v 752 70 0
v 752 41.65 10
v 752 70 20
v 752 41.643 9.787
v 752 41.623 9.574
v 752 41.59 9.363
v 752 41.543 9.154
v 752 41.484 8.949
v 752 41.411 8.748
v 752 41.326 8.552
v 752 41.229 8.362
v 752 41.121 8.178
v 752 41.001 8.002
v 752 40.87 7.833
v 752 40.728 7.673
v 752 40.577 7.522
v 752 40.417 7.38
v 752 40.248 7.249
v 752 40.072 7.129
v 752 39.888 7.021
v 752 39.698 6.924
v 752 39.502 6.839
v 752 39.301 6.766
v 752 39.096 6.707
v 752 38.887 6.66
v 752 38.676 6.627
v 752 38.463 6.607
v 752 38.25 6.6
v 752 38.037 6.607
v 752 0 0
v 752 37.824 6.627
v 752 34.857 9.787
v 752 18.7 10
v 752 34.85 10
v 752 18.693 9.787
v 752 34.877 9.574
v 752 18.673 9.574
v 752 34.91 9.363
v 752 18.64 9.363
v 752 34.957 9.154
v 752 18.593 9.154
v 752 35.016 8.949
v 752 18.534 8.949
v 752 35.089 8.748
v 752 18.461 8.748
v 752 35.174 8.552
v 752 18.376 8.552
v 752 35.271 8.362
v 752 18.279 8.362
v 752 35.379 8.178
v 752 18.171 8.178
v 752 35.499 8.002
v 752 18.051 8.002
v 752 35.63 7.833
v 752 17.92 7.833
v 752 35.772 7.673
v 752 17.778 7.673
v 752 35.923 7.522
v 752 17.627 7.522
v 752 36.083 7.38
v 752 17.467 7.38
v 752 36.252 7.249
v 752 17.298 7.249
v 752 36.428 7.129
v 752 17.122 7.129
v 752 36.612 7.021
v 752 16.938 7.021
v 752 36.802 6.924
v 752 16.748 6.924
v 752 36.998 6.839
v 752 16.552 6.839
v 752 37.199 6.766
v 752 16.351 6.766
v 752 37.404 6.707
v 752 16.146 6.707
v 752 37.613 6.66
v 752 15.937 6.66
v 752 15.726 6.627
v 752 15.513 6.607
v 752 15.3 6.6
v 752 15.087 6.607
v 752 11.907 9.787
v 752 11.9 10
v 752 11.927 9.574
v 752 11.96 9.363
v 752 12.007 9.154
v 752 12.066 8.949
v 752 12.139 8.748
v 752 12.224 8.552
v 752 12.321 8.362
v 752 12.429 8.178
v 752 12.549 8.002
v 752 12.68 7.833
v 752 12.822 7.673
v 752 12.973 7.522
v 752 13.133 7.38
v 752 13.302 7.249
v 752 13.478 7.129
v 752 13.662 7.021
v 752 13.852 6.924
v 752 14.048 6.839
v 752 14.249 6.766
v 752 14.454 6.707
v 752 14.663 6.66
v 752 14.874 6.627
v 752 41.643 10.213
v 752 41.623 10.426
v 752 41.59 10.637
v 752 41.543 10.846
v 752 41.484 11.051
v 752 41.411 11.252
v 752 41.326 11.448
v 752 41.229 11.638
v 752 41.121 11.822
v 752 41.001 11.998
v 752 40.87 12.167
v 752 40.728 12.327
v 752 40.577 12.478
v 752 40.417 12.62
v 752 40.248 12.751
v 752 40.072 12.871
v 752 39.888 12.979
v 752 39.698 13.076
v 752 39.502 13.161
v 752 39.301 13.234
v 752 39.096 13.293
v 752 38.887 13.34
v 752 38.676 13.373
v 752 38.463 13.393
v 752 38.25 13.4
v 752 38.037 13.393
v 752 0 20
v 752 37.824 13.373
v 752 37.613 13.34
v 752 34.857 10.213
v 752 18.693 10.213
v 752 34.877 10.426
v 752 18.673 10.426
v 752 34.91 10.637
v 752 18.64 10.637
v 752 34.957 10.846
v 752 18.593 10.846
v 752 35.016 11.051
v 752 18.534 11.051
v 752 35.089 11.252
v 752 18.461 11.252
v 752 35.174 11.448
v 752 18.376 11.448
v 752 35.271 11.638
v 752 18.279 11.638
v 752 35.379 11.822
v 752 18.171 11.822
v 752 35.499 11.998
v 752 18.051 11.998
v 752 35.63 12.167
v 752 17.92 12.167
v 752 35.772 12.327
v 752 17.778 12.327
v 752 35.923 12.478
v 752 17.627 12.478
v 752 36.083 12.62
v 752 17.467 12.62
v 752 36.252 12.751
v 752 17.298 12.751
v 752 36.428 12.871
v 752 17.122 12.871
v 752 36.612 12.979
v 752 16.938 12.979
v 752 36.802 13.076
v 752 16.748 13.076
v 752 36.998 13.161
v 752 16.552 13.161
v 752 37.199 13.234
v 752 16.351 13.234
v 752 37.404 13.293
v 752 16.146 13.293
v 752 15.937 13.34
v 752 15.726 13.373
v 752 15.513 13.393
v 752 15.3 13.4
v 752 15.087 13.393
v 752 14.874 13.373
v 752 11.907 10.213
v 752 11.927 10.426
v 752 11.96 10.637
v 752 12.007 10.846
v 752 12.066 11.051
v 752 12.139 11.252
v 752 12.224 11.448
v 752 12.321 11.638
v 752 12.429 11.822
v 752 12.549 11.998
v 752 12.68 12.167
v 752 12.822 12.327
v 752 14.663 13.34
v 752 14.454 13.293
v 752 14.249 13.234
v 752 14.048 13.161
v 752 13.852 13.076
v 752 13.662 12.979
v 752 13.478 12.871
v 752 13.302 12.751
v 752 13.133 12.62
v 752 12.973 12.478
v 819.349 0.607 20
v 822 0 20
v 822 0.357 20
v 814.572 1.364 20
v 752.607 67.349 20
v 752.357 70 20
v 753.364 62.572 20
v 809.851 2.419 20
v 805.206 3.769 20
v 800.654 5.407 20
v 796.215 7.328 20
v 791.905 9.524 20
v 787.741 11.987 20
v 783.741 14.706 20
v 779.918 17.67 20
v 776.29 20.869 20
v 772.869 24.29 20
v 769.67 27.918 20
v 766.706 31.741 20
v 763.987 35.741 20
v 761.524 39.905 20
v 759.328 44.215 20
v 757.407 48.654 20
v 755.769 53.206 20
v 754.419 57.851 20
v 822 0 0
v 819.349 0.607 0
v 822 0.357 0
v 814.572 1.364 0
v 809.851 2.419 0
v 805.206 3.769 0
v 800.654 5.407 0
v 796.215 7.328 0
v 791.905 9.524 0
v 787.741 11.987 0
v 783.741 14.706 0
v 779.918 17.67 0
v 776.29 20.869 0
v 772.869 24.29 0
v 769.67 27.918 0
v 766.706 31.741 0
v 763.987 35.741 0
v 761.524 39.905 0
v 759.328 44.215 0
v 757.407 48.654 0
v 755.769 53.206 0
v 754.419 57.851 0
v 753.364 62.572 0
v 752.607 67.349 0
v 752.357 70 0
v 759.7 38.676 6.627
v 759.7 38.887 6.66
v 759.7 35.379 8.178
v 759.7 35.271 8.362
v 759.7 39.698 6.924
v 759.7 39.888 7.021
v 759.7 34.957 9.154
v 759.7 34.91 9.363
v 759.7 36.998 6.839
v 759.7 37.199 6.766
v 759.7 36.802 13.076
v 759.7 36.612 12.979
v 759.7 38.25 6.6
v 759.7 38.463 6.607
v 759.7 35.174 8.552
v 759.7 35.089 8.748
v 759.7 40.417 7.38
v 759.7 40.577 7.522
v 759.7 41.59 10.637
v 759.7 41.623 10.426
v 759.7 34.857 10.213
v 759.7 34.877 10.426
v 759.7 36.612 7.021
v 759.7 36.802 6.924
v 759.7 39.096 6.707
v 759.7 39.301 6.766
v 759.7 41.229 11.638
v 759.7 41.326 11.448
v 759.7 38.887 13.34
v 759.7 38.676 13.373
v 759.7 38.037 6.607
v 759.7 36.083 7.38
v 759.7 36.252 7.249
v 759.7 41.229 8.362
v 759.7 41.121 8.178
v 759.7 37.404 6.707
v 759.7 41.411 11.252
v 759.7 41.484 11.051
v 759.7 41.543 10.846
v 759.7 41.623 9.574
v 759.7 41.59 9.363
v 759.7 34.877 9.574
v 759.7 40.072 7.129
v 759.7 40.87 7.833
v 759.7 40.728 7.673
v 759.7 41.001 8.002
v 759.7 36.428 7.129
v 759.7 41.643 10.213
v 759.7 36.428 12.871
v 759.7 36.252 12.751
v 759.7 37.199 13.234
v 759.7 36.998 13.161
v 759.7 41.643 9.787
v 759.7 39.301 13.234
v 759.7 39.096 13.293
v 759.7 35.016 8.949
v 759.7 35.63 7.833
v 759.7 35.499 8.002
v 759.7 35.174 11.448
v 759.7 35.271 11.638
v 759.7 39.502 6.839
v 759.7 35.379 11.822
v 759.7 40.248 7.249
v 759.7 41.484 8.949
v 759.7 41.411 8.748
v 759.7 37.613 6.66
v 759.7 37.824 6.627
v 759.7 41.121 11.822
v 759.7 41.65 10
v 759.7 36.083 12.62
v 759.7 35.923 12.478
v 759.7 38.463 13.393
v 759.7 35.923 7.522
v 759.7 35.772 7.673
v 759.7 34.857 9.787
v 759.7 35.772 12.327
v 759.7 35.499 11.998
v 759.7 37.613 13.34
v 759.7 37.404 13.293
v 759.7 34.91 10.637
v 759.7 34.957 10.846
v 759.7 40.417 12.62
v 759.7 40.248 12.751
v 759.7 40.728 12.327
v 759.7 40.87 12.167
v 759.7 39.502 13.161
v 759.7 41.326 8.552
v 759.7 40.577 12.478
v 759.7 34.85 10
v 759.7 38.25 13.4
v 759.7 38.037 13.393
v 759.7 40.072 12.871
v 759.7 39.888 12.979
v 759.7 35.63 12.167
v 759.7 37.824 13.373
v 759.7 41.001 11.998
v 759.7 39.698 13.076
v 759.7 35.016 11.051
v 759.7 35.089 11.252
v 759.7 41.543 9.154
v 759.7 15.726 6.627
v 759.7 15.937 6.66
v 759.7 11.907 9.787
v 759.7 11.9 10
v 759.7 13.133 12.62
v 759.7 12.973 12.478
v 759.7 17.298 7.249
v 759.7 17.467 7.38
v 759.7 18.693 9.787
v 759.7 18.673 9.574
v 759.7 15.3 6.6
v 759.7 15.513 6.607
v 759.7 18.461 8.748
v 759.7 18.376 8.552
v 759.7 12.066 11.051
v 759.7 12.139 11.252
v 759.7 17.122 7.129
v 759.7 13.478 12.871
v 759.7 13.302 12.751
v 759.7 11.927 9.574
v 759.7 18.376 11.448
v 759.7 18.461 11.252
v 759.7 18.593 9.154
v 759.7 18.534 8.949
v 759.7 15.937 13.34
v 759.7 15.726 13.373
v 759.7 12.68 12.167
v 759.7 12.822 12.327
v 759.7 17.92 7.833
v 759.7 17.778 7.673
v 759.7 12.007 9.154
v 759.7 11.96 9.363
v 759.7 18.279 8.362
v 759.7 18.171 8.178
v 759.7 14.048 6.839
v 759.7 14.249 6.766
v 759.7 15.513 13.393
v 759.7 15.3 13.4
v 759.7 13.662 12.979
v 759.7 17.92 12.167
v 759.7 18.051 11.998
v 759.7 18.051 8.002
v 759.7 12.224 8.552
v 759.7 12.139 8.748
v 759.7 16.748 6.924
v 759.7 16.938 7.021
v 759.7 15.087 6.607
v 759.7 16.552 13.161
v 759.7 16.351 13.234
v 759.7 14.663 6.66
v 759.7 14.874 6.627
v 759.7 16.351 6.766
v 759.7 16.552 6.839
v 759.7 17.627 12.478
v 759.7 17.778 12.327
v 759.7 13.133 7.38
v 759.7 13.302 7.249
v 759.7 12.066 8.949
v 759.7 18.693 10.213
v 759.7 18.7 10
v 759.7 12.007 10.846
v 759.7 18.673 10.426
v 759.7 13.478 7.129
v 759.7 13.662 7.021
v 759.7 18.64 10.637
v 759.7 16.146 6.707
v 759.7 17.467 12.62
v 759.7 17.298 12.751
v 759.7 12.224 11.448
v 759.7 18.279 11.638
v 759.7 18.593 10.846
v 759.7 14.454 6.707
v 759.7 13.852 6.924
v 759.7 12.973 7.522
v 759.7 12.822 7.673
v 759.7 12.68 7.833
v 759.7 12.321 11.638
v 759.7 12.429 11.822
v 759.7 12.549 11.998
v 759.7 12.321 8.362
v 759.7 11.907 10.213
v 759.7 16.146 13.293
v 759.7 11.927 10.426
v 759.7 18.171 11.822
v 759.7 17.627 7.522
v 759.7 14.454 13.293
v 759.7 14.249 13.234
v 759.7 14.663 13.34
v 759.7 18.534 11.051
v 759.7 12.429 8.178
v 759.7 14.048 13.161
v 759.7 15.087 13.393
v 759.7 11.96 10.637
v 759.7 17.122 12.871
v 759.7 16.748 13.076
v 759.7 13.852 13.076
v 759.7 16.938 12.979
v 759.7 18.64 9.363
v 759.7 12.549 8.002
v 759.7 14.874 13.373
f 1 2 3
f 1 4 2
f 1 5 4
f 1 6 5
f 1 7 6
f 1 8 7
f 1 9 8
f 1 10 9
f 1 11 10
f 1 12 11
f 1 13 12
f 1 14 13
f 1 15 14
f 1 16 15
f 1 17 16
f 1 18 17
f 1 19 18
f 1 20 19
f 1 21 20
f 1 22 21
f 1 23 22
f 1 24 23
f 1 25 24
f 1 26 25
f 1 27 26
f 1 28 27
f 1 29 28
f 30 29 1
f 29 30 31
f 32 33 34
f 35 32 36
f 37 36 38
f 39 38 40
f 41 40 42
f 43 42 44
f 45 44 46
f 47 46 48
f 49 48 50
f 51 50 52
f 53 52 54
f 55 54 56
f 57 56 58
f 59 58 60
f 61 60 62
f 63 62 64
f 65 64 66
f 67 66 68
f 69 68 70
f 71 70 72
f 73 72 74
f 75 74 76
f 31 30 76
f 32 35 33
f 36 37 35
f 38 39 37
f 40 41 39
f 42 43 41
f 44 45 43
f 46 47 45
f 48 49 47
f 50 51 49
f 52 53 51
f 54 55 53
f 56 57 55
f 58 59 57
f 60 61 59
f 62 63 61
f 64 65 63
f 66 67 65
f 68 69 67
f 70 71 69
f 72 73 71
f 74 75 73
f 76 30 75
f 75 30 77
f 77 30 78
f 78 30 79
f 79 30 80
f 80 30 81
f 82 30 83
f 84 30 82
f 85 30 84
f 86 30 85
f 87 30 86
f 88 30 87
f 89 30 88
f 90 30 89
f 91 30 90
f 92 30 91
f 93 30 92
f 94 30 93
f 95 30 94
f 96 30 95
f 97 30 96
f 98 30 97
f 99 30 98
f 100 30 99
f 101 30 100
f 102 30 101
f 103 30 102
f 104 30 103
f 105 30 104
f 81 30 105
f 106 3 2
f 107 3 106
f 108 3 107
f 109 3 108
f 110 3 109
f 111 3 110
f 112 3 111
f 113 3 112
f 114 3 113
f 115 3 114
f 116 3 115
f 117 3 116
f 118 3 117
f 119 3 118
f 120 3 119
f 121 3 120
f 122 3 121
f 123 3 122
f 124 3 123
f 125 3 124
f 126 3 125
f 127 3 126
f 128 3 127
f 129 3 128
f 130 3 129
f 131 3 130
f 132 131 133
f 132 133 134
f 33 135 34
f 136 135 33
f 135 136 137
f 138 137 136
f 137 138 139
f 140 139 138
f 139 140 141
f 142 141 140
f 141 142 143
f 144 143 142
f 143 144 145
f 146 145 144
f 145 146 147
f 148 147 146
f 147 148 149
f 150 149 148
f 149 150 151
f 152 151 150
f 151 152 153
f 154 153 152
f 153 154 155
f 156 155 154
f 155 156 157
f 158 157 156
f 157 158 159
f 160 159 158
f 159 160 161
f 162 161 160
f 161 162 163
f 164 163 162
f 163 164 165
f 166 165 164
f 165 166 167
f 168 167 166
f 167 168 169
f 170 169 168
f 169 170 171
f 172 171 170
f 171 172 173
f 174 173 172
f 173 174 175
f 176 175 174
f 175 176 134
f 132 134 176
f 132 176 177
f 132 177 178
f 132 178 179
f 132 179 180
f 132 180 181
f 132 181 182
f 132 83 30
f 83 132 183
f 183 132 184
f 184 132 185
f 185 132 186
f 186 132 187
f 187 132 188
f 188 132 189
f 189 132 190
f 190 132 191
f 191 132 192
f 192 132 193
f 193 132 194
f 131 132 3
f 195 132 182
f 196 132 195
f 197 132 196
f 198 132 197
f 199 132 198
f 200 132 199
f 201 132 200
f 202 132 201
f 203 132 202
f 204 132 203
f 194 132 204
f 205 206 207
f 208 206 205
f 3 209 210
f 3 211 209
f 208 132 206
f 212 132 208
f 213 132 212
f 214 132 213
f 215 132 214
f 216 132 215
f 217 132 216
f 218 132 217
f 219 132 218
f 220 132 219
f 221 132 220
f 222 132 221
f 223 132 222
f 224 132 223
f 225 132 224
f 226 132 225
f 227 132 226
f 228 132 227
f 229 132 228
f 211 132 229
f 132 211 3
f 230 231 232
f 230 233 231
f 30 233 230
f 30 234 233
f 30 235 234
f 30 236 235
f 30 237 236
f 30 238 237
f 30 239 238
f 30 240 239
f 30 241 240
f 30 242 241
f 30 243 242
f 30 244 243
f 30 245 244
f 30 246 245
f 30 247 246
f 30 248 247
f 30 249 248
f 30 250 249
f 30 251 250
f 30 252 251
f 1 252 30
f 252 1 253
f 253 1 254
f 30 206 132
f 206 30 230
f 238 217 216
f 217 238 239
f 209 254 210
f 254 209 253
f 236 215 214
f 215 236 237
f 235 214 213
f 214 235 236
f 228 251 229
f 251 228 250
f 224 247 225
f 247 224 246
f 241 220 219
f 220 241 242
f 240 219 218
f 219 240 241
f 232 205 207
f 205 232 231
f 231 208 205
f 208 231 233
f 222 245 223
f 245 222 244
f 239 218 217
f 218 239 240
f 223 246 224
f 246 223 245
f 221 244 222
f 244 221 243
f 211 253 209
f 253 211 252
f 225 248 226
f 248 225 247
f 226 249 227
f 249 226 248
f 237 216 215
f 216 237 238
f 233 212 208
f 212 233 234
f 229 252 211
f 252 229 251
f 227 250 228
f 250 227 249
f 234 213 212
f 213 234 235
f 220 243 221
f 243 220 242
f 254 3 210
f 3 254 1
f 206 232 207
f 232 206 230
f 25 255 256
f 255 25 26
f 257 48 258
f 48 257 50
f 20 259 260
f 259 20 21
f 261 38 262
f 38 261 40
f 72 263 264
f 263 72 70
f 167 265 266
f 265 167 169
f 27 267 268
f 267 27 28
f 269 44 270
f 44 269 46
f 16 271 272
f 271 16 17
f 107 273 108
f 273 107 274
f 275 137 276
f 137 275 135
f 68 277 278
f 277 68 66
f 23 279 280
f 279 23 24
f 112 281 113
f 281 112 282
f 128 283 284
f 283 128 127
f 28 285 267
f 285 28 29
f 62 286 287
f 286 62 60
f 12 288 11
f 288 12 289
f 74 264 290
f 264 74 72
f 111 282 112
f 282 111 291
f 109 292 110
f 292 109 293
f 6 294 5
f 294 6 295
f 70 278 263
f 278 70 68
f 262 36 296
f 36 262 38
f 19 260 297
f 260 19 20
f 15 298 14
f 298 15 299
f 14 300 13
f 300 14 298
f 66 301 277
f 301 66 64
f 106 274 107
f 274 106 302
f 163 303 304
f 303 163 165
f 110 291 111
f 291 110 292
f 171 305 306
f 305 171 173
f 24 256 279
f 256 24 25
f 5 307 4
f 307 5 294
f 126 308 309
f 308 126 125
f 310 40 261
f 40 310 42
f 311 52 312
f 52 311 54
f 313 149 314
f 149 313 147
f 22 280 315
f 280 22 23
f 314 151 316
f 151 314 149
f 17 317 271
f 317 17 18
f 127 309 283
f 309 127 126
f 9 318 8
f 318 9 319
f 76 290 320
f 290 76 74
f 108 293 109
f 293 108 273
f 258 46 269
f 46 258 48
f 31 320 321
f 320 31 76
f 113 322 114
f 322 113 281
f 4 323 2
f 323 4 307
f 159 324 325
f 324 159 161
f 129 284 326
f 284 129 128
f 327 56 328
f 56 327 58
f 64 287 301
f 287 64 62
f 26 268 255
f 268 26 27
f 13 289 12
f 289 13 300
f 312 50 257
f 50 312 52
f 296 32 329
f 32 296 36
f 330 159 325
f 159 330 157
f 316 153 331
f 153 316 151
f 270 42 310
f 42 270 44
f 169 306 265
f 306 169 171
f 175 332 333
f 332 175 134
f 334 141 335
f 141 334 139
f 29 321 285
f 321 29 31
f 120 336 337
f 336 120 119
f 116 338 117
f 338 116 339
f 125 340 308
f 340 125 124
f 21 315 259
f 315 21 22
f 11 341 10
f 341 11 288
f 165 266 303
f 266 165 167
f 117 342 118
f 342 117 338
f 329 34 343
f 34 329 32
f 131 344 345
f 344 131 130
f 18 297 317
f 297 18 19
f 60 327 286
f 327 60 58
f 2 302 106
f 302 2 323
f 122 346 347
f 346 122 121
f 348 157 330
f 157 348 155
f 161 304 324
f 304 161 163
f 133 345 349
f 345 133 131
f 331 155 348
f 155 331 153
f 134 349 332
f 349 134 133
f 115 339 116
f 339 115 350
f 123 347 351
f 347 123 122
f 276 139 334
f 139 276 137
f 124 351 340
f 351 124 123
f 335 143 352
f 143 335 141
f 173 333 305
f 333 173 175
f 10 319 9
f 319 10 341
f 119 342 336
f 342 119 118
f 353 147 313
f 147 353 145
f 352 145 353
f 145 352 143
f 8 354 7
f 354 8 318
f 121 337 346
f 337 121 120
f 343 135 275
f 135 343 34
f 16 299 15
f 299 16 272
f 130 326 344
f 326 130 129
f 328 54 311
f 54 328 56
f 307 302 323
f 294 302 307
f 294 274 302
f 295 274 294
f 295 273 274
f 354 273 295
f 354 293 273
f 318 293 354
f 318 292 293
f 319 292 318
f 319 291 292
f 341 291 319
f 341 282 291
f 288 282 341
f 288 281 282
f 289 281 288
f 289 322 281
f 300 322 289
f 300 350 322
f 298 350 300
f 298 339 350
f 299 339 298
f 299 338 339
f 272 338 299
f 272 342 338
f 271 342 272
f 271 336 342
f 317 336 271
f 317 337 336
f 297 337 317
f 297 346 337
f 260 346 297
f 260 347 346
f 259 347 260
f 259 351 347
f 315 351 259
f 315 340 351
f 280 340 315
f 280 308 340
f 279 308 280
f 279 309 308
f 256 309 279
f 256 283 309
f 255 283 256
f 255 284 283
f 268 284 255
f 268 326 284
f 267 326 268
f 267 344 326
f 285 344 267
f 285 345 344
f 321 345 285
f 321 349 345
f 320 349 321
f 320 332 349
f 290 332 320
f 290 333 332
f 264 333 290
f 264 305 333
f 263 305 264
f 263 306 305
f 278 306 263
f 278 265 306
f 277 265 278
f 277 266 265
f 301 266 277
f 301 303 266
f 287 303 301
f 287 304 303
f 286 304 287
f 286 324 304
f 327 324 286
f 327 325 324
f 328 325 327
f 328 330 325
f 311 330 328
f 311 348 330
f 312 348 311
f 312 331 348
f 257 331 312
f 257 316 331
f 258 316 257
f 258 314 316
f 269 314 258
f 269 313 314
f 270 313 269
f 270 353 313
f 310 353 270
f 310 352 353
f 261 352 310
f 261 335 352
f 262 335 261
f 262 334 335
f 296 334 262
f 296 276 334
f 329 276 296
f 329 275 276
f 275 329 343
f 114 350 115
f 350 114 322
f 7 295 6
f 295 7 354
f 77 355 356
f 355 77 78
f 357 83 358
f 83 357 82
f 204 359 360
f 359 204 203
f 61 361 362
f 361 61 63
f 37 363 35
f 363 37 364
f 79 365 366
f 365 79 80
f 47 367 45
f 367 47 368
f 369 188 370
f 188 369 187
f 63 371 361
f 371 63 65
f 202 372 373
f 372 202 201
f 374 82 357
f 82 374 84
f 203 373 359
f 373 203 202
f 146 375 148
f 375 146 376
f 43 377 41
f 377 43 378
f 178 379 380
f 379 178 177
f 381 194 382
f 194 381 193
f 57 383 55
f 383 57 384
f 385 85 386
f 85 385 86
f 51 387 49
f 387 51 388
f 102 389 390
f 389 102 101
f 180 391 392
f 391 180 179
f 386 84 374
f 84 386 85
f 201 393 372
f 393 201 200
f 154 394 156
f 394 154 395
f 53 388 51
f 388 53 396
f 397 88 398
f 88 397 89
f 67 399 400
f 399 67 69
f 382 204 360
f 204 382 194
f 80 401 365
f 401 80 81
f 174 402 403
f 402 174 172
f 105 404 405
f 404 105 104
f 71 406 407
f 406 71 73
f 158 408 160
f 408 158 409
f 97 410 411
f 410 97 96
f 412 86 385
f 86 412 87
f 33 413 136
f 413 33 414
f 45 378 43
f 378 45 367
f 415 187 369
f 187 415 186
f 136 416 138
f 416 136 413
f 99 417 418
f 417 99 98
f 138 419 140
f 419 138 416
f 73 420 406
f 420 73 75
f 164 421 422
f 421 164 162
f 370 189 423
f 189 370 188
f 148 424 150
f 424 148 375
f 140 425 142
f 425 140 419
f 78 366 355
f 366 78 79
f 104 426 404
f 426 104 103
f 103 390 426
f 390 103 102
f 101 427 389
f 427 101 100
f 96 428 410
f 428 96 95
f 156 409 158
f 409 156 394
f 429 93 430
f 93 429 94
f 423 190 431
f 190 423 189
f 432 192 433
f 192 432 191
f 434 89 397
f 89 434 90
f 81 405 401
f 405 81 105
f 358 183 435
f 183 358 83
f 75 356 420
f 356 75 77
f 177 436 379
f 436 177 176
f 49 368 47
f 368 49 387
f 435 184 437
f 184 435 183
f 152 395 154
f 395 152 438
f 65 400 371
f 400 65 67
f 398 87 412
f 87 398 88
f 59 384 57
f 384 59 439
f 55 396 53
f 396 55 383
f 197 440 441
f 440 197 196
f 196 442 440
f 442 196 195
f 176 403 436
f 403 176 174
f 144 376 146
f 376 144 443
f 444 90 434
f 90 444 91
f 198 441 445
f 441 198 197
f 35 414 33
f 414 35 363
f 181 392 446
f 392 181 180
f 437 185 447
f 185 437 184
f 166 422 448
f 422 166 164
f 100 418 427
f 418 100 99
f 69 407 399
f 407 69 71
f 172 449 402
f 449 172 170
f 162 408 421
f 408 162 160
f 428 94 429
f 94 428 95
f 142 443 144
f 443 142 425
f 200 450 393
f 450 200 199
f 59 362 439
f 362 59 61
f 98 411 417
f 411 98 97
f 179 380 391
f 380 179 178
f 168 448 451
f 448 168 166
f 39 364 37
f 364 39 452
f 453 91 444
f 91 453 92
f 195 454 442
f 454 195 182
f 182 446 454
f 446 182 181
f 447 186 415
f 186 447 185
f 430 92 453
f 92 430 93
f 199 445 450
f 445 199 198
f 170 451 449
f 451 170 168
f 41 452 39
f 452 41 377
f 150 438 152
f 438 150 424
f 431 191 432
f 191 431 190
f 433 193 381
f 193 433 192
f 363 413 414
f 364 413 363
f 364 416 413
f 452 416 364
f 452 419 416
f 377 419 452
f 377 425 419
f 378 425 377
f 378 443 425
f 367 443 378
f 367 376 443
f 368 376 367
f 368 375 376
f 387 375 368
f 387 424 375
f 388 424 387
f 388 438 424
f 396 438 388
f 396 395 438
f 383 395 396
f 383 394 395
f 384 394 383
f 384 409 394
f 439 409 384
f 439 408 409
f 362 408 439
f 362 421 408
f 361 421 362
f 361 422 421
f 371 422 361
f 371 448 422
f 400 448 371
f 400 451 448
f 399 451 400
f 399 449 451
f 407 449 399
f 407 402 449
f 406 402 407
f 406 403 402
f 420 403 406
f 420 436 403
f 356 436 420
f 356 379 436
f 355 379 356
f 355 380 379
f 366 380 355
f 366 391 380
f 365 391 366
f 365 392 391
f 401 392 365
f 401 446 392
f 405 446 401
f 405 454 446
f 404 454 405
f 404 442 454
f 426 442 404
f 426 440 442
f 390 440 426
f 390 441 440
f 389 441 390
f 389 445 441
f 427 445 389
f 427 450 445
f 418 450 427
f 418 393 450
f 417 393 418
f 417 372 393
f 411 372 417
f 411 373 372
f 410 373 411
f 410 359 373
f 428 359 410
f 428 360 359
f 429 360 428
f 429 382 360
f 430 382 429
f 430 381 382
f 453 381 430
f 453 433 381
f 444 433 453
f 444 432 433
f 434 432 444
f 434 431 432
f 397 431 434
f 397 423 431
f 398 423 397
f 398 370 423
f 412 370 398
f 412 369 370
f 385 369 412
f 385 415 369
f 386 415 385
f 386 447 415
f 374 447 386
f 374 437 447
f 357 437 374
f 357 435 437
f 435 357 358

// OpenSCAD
// file: corner.scad
corner_r = 100;
h = 20;
cut_side = 7;




module corner(r = corner_r) {
    $fn = 100;
    fix = 0.1;
    
    translate([r,r,0])
    rotate([0,0,180])
    difference() {
        cube([r,r,h]);
        translate([0,0,-fix])
        cylinder(r=r, h=h+fix*2);

        translate([r-cut_side/2,0,-fix])
        cube([cut_side, cut_side, h+fix*2]);
        
        translate([0, r-cut_side/2,-fix])
        cube([cut_side, cut_side, h+fix*2]);
    }
}

module check() {
    cut = 0.5;
    
    translate([corner_r-cut_side+0.3,0,0])
    cube([cut,cut,h]);
}

//check();

//corner();
// file: all.scad
min_thick = 0.3;
fix = 0.001;
field_width = 1200;
field_length = 1800;

gate_inner_w = 240;
gate_outer_w = 298;

gate_upright_l = 70.5;
gate_upright_w = (gate_outer_w-gate_inner_w)/2;

gate_middle_w = gate_upright_w+gate_inner_w;

w_margin = 3;
l_margin = 3;

goalpost_w = (gate_outer_w-gate_inner_w)/2+w_margin*2;
goalpost_l = gate_upright_l+l_margin*2;
goalpost_h = 20;

door_inner_width = gate_inner_w - w_margin*2;
door_outer_width = door_inner_width + goalpost_w*2;

pin_epsilon = 0.3;


include <corner.scad>;

module field() {
    fix = 0.1;
    color("gray")
    cube([field_width, field_length, fix]);
}

module pin(void = false) {
    $fn=100;
    length = 14;
    r=3.2;

    function p() = void?0.2:0;
    function pd() = void?0.7:0;

    rotate([0,90,0])
    cylinder(r=r+p(),h=length+pd()*2, center=true);

}

module corners() {
    corner();

    translate([field_width,0,0])
    mirror([1,0,0])
    corner();

    translate([0,field_length,0])
    mirror([0,1,0])
    corner();

    translate([field_width,field_length,0])
    mirror([1,1,0])
    corner();
}

module door_corners_pins(void=false) {
        translate([field_width/2 - door_outer_width/2,goalpost_l*(0.5),goalpost_h/2])
        pin(void);

        translate([field_width/2 - door_outer_width/2,goalpost_l*(0.5-pin_epsilon),goalpost_h/2])
        pin(void);



        translate([field_width/2 + door_outer_width/2,goalpost_l*(0.5),goalpost_h/2])
        pin(void);

        translate([field_width/2 + door_outer_width/2,goalpost_l*(0.5-pin_epsilon),goalpost_h/2])
        pin(void);

}


module door_base_pins(void=false) {

        door_corners_pins(void);

        translate([field_width/2 - door_outer_width/2,goalpost_l*(0.5+pin_epsilon),goalpost_h/2])
        pin(void);

        translate([field_width/2 + door_outer_width/2,goalpost_l*(0.5+pin_epsilon),goalpost_h/2])
        pin(void);
}


module door_corners() {
    r = 77;

    difference() {
        translate([(field_width-door_outer_width)/2,0,0])
        union() {
            mirror([1,0,0])
            corner(r=r);

            translate([door_outer_width,0,0])
            corner(r=r);
        };
        door_corners_pins(void=true);
    }
}

module door_base() {
    $fn=100;

    r = 20;

    difference() {
        translate([field_width/2,0,0])
        translate([-door_outer_width/2,0,0])
        union() {
            cube([goalpost_w, goalpost_l, goalpost_h]);

            translate([goalpost_w+door_inner_width,0,0])
            cube([goalpost_w, goalpost_l, goalpost_h]);

            translate([goalpost_w-fix,0,0])
            cube([door_inner_width+fix*2, goalpost_l, min_thick]);

            intersection() {
                translate([goalpost_w-fix, 0, 0])
                cube([door_inner_width+fix*2, goalpost_l, goalpost_h]);

                translate([goalpost_w-fix, goalpost_l-10.04, -(r-3)])
                rotate([0, 90, 0])
                cylinder(r=r, h=door_inner_width+fix*2);
            }
        }

        door_base_pins(void=true);

    }



}

module gate() {
//    translate([10.6,26.75,0])
//    import("gate/gate.stl");

    translate([field_width/2, 0, goalpost_h])
    translate([-gate_middle_w/2, gate_upright_l/2+l_margin,0])
    scale([1.32,1.32,1.32])
    union() {
        import("gate/upright.stl");

        translate([1.5,0,77.55])
        import("gate/angle_L.stl");

        translate([97.9,0,88.1])
        import("gate/traverse_186mm.stl");

        translate([203.0,0,77.55])
        import("gate/angle_R.stl");

        translate([203.7,0,0])
        import("gate/upright.stl");
    }
}
// main file
include <all.scad>;

/* corners(); */
/* field(); */


/* translate([0,field_length,0])
mirror([0,1,0])
door_corners(); */



/* gate(); */


intersection() {
    translate([field_width/2,-fix,-fix])
    cube([field_width/2, goalpost_l+10+fix*2, goalpost_h+10+fix*2]);

    //door_base();
    door_corners();
}


/* intersection() {
    translate([0,-fix,-fix])
    cube([field_width/2, goalpost_l+10+fix*2, goalpost_h+10+fix*2]);

    //door_base();
    door_corners();

} */


/* pin(); */

echo(door_inner_width);
